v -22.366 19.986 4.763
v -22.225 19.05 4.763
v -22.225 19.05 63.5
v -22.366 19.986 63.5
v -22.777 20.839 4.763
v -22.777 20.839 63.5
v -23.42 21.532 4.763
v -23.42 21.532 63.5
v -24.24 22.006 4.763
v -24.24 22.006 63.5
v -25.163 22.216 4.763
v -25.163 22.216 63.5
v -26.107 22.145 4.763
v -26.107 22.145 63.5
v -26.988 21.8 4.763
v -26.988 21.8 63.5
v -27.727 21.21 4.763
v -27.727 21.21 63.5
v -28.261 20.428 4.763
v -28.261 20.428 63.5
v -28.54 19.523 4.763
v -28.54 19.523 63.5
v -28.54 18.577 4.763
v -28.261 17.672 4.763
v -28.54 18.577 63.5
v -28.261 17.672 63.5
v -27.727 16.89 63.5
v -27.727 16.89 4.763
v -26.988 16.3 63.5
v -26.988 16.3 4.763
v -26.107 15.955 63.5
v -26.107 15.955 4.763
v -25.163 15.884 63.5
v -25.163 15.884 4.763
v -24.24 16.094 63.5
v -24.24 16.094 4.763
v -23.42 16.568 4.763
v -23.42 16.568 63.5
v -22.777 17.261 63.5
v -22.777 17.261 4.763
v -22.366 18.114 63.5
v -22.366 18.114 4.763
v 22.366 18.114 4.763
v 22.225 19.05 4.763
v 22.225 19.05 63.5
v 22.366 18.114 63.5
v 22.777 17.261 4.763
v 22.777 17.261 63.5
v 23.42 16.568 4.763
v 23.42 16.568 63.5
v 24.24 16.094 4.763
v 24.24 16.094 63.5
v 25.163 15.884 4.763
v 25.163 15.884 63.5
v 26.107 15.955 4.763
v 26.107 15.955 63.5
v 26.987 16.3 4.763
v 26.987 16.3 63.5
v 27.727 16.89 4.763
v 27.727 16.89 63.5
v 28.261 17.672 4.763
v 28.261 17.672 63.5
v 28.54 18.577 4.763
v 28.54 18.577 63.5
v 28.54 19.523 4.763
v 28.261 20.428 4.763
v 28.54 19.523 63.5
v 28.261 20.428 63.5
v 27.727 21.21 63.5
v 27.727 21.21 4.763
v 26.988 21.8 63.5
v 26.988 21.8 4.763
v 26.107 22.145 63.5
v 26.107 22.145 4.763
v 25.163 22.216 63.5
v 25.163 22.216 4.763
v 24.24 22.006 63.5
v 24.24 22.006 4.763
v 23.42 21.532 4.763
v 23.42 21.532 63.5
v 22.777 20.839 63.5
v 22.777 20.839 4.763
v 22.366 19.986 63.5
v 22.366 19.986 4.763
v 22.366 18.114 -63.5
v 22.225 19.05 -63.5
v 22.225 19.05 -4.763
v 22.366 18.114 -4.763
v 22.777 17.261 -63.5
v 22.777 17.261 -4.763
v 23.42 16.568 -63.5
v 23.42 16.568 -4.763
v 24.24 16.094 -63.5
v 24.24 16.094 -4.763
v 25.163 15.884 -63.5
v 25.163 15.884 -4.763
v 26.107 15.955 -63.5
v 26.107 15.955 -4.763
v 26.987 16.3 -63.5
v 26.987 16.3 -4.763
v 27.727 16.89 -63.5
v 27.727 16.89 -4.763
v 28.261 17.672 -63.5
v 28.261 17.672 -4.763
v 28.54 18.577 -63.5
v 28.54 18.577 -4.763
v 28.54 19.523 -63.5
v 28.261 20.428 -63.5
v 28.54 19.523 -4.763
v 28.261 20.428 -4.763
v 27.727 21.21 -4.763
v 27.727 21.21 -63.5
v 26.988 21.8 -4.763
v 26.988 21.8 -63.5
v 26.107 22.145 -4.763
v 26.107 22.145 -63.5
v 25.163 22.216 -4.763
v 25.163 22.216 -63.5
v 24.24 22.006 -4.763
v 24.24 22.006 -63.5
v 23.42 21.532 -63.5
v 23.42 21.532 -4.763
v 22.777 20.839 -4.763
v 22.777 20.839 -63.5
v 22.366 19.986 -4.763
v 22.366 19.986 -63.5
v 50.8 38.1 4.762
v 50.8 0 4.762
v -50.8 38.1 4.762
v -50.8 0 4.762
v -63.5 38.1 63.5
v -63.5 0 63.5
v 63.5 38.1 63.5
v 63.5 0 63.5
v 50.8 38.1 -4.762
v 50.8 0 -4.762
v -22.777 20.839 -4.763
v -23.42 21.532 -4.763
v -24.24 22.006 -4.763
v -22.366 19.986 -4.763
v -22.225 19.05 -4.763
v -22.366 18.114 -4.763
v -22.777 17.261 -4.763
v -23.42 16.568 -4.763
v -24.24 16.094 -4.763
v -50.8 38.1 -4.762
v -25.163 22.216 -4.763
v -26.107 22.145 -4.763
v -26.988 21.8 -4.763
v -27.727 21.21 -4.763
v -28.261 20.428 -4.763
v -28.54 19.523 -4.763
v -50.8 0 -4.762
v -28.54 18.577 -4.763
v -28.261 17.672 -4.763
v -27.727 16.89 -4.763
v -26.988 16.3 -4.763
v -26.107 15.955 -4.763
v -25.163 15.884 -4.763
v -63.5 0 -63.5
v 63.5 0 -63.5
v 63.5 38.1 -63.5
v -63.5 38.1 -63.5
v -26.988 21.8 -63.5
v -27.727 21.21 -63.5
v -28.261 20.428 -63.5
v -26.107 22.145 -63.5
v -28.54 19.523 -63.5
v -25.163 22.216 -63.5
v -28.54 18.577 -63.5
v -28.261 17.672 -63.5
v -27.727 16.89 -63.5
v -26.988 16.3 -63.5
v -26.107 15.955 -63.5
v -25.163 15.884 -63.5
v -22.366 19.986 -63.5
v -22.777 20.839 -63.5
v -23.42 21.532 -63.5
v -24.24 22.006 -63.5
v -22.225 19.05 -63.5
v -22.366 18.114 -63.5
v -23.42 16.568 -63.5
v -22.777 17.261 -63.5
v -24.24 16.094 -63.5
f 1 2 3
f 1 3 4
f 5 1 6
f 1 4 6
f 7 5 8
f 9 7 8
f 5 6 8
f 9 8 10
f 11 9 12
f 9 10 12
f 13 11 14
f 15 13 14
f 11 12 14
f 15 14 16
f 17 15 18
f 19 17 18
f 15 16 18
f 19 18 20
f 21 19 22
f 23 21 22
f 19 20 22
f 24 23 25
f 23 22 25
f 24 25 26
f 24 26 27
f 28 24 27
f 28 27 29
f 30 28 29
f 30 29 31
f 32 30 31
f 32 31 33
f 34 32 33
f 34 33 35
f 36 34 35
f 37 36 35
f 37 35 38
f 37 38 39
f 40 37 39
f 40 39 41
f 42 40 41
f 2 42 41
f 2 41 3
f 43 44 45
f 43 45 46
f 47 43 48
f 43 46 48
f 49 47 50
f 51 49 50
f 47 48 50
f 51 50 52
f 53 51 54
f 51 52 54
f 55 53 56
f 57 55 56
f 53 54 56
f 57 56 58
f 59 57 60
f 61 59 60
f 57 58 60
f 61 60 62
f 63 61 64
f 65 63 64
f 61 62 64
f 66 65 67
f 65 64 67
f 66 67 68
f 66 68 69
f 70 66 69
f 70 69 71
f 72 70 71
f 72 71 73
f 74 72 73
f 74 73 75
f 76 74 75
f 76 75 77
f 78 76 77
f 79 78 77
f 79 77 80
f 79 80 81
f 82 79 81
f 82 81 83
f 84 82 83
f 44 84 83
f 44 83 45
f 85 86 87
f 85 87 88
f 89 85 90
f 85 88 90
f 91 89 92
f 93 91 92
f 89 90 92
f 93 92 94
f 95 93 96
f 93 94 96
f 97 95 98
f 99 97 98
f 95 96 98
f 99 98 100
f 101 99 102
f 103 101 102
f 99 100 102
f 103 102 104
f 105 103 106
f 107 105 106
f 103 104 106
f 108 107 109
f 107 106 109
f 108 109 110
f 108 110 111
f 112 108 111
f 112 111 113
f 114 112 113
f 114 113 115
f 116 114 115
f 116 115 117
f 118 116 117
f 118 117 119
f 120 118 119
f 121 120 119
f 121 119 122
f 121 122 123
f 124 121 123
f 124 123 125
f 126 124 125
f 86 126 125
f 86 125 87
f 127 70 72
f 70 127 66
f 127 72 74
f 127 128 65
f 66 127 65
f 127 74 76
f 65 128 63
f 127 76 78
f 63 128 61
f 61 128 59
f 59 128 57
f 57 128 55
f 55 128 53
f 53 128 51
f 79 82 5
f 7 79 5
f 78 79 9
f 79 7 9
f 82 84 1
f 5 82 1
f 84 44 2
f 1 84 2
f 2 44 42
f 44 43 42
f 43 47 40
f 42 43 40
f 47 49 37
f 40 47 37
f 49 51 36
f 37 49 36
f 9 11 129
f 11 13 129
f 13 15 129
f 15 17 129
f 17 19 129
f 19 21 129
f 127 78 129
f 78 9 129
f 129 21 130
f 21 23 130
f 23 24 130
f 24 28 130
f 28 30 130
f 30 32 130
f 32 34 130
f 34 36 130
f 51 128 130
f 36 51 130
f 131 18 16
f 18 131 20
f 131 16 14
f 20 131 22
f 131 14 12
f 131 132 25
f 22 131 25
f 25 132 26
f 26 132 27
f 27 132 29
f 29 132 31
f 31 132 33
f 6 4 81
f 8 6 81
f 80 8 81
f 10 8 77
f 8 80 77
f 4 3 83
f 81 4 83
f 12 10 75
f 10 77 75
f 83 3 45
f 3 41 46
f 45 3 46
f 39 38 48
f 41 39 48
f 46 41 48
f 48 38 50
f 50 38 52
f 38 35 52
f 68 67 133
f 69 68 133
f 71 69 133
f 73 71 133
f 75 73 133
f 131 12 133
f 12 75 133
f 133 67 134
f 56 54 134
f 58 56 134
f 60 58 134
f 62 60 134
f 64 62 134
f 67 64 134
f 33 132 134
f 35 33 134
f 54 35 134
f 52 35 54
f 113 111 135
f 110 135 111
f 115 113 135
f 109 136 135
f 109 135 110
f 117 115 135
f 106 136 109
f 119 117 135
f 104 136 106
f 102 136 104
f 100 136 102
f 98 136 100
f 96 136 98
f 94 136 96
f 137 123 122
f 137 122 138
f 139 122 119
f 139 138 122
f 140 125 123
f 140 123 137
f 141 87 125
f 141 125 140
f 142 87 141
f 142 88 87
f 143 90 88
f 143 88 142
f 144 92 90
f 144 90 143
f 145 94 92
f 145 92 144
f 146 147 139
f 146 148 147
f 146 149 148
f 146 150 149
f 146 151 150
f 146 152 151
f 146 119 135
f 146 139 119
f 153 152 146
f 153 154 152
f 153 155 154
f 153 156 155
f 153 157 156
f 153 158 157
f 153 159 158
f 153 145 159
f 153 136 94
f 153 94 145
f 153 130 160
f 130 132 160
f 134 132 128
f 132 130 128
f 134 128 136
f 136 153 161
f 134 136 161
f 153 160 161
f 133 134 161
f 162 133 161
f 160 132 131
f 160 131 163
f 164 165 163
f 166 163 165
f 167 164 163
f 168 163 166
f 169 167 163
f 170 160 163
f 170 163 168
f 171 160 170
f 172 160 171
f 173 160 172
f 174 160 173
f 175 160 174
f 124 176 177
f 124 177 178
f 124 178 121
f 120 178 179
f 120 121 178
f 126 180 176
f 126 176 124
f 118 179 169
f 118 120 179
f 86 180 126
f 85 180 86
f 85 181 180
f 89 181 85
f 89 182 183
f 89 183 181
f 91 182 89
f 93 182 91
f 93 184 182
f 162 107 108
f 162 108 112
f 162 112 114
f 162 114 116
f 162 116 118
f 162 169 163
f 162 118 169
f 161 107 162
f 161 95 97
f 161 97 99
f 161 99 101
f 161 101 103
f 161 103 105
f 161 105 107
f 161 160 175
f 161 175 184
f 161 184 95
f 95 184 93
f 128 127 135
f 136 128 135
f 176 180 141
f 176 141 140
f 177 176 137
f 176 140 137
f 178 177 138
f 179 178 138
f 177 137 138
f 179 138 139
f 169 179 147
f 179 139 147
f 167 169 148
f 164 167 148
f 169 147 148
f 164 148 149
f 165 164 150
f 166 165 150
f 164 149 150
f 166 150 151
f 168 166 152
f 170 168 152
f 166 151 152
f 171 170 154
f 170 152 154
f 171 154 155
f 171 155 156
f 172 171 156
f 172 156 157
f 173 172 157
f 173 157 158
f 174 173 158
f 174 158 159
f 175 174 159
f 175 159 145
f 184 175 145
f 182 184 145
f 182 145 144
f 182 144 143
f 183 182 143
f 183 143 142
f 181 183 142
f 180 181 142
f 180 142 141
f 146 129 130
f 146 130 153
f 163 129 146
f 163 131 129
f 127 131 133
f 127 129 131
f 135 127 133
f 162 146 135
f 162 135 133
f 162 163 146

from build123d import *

# Parameters (mm, degrees)
SKETCH1_W           = 127
SKETCH1_H           = 127
BOSS_EXTRUDE1_DEPTH = 38.1
SKETCH2_W           = 101.6
SKETCH2_H           = 9.525
CUT_EXTRUDE1_DEPTH  = 98.550550998
SKETCH3_R           = 3.175
CUT_EXTRUDE2_DEPTH  = 148.013128665


with BuildPart() as part:
    # Sketch1 → Boss-Extrude1 (new body)
    with BuildSketch(Plane(origin=(0, 0, 0), x_dir=(1, 0, 0), z_dir=(0, 1, 0))):
        Rectangle(SKETCH1_W, SKETCH1_H)
    extrude(amount=BOSS_EXTRUDE1_DEPTH)

    # Sketch2 → Cut-Extrude1 (cut, through all)
    with BuildSketch(Plane(origin=(0, 0, 0), x_dir=(-1, 0, 0), z_dir=(0, -1, 0))):
        Rectangle(SKETCH2_W, SKETCH2_H)
    extrude(amount=-CUT_EXTRUDE1_DEPTH, mode=Mode.SUBTRACT)

    # Sketch3 → Cut-Extrude2 (cut, through all)
    with BuildSketch(Plane.XY.offset(63.5)):
        with Locations((-25.4, 19.05)):
            Circle(SKETCH3_R)
        with Locations(Location((25.4, 19.05, 0), (0, 0, 180))):
            Circle(SKETCH3_R)
    extrude(amount=-CUT_EXTRUDE2_DEPTH, mode=Mode.SUBTRACT)


solid = part.part
